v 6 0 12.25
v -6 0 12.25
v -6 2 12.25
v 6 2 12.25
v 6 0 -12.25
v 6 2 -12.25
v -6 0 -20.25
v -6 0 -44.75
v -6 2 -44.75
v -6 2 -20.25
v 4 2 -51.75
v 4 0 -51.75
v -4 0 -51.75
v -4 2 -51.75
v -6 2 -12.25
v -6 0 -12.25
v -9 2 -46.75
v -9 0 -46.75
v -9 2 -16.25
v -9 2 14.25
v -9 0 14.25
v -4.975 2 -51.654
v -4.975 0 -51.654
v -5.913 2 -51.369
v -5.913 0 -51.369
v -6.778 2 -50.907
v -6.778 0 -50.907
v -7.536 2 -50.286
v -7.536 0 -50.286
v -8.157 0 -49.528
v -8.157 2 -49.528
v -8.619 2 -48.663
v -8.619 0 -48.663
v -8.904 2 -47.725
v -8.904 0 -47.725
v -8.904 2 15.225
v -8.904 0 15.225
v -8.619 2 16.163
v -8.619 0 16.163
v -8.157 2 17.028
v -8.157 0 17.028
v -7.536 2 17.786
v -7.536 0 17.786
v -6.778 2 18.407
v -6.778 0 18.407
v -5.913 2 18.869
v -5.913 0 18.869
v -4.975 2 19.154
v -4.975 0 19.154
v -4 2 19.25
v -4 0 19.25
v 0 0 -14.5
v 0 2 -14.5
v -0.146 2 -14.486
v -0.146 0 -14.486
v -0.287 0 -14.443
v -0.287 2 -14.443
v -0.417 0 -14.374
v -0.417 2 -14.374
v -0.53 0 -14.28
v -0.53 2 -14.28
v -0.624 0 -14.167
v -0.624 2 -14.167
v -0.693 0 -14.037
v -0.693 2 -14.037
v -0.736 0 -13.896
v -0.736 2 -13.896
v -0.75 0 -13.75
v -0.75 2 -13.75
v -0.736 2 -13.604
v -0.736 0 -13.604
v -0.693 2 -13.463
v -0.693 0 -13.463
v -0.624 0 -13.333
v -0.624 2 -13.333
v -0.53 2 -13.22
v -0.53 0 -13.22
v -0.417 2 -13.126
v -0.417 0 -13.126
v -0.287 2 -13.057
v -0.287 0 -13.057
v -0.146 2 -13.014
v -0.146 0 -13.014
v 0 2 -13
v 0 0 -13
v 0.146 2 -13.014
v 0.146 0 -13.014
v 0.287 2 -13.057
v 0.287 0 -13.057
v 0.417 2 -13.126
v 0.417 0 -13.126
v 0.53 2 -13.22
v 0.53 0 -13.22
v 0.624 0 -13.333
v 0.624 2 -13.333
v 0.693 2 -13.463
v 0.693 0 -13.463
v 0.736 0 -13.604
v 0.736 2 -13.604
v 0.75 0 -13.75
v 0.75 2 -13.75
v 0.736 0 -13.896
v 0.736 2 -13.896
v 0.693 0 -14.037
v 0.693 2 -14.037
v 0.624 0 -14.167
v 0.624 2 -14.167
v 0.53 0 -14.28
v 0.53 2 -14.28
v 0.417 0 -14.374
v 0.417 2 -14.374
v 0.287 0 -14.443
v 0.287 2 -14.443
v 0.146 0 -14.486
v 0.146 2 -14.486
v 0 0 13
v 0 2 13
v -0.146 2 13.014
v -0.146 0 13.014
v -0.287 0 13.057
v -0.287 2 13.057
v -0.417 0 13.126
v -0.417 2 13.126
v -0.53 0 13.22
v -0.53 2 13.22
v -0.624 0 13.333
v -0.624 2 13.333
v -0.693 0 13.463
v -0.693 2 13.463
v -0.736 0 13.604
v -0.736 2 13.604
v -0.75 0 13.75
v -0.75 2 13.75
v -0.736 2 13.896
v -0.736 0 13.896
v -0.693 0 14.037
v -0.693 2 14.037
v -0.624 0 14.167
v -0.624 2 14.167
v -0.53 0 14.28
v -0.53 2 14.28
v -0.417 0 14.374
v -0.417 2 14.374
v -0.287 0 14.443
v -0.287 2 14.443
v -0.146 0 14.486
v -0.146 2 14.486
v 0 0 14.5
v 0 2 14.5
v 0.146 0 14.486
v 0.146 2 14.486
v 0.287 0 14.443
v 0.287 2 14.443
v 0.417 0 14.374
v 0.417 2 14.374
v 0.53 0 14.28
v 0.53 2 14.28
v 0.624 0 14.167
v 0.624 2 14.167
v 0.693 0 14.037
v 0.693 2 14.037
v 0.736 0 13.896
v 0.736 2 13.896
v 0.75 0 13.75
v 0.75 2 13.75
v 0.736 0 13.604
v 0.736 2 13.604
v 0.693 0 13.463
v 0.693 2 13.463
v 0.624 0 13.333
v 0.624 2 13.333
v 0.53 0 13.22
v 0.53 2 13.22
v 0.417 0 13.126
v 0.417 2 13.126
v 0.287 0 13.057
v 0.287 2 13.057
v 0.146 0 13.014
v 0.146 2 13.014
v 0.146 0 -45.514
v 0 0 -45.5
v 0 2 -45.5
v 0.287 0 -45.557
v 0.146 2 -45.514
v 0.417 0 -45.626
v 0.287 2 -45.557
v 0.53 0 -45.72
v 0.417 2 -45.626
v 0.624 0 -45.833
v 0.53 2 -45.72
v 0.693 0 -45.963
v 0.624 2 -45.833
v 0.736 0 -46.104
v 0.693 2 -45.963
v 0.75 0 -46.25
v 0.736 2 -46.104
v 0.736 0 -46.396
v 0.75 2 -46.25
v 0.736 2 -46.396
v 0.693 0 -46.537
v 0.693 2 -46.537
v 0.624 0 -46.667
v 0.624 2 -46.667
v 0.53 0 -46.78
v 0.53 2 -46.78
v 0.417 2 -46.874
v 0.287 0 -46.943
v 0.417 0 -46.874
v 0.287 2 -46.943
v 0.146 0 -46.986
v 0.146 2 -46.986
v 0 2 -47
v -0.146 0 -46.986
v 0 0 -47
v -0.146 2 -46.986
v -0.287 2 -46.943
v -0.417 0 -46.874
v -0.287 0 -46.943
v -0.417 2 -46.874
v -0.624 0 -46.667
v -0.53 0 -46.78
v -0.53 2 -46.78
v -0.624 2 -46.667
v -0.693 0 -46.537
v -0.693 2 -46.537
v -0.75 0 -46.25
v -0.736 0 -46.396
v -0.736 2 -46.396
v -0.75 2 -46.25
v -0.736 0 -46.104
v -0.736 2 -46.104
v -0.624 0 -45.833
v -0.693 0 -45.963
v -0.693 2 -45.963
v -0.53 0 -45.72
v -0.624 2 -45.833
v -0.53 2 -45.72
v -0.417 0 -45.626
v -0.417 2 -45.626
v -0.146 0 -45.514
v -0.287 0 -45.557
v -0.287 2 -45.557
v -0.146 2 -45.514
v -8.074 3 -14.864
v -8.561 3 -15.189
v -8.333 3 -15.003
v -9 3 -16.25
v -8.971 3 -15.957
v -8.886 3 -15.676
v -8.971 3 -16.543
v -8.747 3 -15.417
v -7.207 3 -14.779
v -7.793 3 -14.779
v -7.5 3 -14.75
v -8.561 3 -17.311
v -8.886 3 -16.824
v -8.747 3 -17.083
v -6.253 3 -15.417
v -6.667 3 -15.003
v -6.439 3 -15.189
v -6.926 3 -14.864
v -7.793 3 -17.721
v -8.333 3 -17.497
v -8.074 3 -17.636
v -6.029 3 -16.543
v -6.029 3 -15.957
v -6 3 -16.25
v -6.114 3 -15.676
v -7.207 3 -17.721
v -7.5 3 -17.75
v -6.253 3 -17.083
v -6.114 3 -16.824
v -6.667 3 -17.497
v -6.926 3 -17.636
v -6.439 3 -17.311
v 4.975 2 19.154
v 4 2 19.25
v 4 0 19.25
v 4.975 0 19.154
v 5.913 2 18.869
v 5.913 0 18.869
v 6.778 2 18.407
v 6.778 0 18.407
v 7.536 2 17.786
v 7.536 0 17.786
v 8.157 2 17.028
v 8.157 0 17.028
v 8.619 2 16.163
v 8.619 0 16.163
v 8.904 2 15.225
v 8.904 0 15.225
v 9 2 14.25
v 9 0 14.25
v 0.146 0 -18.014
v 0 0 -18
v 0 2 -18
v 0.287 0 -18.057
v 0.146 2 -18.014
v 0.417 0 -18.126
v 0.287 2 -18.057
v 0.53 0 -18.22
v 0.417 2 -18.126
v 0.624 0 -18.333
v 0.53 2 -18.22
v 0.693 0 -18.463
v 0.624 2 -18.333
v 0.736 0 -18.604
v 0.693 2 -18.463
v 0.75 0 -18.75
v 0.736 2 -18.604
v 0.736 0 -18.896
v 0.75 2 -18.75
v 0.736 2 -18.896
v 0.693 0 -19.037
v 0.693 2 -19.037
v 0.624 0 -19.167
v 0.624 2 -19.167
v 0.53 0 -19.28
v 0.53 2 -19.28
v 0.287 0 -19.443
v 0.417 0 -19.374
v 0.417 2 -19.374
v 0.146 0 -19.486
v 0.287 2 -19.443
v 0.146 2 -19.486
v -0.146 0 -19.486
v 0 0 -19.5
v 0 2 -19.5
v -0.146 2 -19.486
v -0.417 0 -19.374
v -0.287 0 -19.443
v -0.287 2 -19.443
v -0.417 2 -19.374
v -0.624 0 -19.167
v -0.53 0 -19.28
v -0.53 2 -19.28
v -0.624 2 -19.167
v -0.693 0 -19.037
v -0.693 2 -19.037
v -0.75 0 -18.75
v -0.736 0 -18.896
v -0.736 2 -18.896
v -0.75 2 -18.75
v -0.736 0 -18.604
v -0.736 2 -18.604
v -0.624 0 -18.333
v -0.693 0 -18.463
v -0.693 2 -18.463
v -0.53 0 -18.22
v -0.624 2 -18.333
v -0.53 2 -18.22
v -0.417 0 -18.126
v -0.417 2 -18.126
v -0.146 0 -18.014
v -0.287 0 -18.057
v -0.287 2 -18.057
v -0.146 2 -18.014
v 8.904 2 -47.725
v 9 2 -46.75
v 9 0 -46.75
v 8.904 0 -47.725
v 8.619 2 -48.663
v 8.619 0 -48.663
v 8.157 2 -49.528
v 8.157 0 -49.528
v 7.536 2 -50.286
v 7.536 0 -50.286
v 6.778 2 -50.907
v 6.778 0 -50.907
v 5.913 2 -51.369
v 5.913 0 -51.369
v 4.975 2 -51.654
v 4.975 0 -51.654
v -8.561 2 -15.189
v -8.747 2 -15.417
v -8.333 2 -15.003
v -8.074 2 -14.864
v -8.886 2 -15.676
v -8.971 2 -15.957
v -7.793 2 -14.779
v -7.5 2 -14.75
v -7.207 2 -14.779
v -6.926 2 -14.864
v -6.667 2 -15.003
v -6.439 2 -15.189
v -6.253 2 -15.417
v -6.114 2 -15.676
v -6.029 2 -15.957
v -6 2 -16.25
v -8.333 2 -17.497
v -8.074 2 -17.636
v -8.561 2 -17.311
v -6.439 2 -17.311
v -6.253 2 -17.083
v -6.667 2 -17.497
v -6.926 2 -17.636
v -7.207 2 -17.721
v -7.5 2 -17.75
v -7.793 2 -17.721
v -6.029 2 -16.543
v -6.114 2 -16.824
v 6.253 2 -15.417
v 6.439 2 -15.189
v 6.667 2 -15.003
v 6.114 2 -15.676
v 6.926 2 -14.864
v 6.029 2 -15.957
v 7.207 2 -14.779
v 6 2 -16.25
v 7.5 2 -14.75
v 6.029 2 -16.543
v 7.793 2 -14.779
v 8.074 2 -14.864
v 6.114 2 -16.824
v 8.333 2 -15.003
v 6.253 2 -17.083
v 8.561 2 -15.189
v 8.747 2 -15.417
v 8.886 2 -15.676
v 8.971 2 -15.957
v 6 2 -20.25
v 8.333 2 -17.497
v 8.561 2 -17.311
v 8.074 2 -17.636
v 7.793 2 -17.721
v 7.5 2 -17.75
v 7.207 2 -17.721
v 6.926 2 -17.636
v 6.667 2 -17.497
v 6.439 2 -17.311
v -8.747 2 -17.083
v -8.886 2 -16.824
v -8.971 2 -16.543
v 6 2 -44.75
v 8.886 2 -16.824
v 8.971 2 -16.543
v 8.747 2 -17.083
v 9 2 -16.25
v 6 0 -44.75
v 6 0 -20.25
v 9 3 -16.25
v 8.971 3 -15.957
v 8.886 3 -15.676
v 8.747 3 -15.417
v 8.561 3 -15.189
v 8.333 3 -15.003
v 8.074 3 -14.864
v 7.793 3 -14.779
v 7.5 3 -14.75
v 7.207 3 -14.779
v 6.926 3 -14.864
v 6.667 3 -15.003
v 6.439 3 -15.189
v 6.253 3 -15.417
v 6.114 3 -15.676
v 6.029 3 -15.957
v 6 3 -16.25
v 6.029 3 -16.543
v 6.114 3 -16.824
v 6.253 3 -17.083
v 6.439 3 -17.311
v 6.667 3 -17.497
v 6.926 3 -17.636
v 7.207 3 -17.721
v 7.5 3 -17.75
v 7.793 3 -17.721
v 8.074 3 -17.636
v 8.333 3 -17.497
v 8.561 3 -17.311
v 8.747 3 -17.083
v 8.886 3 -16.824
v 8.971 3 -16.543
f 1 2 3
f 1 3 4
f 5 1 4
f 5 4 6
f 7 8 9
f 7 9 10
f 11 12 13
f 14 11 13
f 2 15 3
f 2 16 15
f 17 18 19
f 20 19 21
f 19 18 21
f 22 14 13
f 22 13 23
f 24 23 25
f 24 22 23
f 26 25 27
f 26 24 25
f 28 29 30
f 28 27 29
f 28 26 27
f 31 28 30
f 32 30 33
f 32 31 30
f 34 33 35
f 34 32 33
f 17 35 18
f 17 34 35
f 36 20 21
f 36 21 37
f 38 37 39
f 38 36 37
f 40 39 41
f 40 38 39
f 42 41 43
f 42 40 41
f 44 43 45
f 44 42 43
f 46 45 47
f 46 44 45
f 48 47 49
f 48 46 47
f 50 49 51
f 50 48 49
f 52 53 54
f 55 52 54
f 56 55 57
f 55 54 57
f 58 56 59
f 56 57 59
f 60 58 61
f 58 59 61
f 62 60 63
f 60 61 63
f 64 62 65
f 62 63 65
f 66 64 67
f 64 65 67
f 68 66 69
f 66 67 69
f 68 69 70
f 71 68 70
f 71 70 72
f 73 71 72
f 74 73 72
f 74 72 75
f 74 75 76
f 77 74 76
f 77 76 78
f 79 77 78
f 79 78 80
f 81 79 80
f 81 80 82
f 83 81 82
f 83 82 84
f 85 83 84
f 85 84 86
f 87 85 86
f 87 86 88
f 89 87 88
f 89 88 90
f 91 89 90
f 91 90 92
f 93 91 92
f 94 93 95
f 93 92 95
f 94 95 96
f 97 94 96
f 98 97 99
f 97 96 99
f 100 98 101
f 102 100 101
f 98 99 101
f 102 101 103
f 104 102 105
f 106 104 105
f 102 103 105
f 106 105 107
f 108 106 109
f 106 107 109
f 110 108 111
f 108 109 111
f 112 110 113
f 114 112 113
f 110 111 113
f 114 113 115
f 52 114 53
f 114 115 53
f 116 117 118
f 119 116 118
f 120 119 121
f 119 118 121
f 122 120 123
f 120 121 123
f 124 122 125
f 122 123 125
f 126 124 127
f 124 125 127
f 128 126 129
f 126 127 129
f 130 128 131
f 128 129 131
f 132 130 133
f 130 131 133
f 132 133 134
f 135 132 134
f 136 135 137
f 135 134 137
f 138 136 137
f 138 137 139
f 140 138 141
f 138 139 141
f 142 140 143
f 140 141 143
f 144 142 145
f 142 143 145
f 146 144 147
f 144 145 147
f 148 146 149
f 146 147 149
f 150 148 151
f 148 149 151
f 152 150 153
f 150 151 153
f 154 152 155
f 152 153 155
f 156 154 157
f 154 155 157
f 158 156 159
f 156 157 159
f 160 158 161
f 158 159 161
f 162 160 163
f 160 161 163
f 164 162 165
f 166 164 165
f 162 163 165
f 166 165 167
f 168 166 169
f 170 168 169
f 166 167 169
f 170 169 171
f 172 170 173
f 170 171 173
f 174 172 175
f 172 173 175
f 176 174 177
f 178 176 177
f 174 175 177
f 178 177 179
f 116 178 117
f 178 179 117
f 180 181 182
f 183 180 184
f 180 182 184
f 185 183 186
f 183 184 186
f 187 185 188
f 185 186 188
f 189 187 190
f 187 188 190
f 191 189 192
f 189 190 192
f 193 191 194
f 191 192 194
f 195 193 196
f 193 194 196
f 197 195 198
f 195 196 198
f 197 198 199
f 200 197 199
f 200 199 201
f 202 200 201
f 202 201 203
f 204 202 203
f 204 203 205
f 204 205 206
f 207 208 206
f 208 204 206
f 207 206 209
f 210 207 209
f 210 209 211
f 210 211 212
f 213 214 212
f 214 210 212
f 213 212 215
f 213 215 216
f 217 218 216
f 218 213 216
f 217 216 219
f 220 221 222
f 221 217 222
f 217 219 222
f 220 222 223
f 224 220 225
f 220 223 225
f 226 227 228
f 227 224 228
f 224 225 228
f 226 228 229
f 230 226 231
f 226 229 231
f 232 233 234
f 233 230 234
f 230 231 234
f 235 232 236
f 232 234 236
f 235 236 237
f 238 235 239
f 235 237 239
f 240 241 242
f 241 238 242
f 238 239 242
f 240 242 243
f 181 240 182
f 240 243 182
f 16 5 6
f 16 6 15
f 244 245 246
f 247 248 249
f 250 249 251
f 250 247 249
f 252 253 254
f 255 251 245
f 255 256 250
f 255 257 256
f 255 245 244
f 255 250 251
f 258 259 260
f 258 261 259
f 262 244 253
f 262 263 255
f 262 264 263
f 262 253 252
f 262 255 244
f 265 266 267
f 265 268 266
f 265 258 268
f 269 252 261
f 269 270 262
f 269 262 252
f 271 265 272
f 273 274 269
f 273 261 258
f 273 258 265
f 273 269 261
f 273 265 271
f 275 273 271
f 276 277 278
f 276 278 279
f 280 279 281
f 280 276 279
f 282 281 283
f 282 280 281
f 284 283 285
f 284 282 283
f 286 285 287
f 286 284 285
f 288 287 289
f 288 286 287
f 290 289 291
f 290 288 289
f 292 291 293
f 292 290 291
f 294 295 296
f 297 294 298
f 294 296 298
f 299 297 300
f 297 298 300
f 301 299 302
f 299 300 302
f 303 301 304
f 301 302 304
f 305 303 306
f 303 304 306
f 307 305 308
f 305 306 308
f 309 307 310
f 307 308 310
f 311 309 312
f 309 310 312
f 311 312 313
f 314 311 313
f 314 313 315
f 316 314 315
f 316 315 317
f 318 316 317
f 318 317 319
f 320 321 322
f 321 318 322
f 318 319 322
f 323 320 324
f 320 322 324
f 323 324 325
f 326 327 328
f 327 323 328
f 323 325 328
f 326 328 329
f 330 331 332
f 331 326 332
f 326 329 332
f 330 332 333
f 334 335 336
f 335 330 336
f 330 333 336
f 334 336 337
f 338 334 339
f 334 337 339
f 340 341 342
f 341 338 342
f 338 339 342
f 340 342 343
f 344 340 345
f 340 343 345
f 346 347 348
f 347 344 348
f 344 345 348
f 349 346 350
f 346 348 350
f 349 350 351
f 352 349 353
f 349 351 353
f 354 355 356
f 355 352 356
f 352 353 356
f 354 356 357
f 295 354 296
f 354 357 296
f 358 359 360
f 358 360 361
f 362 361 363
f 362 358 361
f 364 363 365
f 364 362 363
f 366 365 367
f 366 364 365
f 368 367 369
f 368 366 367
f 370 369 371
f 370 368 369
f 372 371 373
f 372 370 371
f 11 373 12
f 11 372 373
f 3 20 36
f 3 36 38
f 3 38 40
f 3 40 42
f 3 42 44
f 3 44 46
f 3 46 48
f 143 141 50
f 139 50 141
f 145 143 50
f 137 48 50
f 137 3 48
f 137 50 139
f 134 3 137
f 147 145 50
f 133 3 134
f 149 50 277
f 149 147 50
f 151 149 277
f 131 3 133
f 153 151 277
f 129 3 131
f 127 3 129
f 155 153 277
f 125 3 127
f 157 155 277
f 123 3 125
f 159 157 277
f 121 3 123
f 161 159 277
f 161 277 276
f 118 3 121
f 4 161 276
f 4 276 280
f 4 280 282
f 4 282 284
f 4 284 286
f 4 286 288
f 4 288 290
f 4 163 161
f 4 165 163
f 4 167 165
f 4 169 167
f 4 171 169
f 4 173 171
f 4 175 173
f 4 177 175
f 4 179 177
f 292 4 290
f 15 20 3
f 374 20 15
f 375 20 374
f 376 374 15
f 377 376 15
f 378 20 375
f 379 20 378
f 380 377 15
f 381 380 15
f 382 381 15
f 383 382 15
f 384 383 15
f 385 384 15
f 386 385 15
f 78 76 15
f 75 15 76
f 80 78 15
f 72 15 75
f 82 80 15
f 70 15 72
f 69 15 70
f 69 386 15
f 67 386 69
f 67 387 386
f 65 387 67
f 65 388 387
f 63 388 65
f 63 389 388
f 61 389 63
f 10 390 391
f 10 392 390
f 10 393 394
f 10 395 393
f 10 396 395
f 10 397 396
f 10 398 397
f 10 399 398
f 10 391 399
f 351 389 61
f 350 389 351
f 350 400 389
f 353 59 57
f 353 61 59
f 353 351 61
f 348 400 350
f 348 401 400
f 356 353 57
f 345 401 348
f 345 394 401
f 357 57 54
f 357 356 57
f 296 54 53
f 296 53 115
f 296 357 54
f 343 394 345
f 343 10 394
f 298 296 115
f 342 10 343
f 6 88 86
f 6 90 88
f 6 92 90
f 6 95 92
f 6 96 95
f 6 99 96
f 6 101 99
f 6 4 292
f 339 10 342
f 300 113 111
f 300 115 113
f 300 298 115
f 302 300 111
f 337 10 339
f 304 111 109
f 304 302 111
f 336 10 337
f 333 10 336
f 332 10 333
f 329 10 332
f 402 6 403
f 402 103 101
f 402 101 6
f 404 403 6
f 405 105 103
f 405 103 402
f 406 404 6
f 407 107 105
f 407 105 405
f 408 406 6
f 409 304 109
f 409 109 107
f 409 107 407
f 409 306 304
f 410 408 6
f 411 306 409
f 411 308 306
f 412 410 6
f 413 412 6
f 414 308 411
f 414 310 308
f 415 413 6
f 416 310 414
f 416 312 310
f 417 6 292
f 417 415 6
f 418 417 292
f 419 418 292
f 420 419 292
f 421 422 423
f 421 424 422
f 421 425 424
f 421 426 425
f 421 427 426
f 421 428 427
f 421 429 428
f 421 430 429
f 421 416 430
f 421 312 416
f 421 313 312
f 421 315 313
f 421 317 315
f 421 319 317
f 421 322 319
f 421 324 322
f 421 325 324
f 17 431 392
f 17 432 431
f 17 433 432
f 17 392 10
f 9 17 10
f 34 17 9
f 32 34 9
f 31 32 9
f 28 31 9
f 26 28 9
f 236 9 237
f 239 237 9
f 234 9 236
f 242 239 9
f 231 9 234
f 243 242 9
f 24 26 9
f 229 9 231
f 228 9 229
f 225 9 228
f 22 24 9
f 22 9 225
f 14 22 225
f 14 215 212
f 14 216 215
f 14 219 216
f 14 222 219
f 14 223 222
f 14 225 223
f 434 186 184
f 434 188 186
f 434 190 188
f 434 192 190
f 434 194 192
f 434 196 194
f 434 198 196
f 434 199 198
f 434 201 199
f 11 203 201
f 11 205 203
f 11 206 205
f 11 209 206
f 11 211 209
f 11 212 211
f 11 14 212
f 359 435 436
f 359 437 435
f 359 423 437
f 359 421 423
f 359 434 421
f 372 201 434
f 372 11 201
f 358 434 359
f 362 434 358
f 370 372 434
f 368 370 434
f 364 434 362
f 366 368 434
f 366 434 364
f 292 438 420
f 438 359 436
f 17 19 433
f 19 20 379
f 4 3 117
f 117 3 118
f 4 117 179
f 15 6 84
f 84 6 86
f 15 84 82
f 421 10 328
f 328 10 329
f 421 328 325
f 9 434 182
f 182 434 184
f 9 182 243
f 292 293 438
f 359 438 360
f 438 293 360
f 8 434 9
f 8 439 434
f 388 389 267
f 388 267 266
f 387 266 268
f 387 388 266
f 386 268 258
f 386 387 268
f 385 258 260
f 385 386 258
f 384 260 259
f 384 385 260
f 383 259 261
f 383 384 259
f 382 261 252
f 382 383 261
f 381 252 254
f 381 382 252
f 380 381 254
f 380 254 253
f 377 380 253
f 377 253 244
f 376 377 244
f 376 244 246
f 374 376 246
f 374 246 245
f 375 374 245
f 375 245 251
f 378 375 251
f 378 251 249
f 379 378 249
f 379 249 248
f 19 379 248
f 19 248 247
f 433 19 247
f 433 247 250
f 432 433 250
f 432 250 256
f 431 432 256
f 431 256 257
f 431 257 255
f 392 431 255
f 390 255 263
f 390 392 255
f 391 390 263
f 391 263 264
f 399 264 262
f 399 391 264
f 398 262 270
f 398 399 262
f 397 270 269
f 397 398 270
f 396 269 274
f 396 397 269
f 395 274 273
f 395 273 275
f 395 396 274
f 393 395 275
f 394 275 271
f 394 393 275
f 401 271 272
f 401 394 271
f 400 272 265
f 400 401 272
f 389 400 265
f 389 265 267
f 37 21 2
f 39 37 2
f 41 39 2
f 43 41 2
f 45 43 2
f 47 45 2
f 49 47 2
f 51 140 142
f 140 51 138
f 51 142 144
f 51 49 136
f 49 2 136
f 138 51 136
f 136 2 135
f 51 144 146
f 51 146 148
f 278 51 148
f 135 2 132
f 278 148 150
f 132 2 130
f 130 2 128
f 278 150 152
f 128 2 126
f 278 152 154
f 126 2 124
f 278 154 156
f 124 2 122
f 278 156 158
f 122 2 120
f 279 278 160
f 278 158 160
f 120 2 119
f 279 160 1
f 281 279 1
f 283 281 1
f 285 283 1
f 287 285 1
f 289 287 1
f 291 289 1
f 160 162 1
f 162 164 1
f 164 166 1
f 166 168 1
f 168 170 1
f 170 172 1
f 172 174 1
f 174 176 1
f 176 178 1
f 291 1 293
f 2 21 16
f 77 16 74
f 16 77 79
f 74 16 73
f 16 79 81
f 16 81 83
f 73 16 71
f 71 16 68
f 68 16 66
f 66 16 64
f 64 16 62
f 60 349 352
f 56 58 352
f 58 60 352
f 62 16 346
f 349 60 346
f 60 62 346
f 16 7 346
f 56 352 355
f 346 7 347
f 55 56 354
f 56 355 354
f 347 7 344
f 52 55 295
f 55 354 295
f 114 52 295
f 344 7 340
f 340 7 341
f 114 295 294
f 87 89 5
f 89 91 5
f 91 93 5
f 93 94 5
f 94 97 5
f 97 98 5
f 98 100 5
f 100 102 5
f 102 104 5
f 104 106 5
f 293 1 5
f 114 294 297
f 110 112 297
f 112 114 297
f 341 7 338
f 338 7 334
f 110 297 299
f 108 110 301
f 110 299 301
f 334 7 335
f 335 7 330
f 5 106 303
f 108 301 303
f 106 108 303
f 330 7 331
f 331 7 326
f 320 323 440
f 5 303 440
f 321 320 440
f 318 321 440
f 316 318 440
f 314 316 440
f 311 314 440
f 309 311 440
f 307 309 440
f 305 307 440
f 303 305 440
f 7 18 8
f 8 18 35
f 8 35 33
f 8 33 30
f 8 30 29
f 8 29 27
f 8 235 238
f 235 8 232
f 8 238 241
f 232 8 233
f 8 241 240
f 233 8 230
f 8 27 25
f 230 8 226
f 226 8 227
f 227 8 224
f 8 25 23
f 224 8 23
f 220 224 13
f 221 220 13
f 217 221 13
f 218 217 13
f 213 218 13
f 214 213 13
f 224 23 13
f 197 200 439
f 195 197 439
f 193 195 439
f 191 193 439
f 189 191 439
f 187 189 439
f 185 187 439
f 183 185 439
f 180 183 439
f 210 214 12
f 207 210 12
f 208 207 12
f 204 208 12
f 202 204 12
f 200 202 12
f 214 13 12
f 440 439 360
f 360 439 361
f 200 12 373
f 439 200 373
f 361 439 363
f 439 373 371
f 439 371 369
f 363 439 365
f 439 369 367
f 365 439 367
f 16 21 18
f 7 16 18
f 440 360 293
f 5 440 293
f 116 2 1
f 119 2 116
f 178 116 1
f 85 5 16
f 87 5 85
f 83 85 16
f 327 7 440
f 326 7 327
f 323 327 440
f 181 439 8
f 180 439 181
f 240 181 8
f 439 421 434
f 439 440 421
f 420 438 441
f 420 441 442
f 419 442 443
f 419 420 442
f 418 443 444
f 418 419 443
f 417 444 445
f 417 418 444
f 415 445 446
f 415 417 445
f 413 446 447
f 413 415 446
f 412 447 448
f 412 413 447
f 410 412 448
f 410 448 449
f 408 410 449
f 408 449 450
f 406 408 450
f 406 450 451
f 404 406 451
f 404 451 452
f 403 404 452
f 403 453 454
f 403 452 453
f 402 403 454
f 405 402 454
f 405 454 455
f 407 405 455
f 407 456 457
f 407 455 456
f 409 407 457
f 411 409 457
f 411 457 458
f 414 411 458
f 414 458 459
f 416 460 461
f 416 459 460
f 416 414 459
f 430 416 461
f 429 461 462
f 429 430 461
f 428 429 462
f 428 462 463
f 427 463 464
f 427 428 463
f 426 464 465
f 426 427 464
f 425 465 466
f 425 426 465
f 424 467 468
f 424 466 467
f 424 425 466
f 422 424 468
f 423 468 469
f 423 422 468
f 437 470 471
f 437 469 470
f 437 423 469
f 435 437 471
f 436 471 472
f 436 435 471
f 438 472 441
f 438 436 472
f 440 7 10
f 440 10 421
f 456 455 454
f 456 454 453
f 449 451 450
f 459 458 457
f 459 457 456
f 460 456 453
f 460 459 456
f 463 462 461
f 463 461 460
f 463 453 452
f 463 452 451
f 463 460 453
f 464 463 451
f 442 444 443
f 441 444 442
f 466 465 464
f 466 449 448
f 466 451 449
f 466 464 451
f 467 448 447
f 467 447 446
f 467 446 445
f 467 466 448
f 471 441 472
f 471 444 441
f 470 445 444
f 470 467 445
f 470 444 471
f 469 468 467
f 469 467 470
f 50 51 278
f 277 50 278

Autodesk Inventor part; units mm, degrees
ref_plane "YZ Plane" through (0, 0, 0) normal (1, 0, 0) x (0, 1, 0)
ref_plane "XZ Plane" through (0, 0, 0) normal (0, 1, 0) x (-1, 0, 0)
sketch "スケッチ1" plane through (0, 0, 0) normal (0, 1, 0) x (-1, 0, 0)
  line L0 (6, 12.25) -> (-6, 12.25)
  line L1 (-6, 12.25) -> (-6, -12.25)
  line L2 (-6, -12.25) -> (6, -12.25)
  line L3 (6, -12.25) -> (6, 12.25)
  line L4 (9, 19.25) -> (-9, 19.25)
  line L5 (-9, 19.25) -> (-9, -16.25)
  line L6 (-9, -16.25) -> (9, -16.25)
  line L7 (9, -16.25) -> (9, 19.25)
  line L8 (0, -13.75) -> (0, 13.75) construction
  point P0 (0, 0)
  point P1 (6, 0)
  point P2 (0, 12.25)
  point P3 (0, 19.25)
  point P4 (9, 1.5)
  point P5 (0, 0)
  dimension "d0" = 24.5
  dimension "d1" = 12
  dimension "d2" = 3
  dimension "d3" = 4
  dimension "d4" = 7
  dimension "d8" = 27.5
extrude "押し出し1" add sketch "スケッチ1" along normal blind 2
hole "穴1" at (0, 0, -13.75) at (0, 0, 13.75) direction (0, 1, 0) diameter 1.5 end through all
mirror "ミラー1" about plane through (9, 0, -16.25) normal (0, 0, -1) of "押し出し1", "穴1"
fillet "フィレット1" radius 5 4 edges at (-9, 1, 19.25) (9, 1, 19.25) (9, 1, -51.75) (-9, 1, -51.75)
ref_plane "位置合わせ" through (-6, 0, -16.25) normal (0, 0, 1) x (1, 0, 0)
sketch "スケッチ2" plane through (0, 2, 0) normal (0, 1, 0) x (1, 0, 0)
  line L0 (-9, -14.25) -> (-9, 46.75) projected
  line L1 (9, -14.25) -> (9, 46.75) projected
  circle A0 centre (0, 18.75) radius 0.75 projected
  circle A1 centre (0, 13.75) radius 0.75 projected
  circle A2 centre (7.5, 16.25) radius 1.5
  circle A3 centre (-7.5, 16.25) radius 1.5
  line L2 (0, 18.75) -> (0, 13.75) construction
  point P0 (0, 0)
  point P1 (0, 16.25)
  dimension "d16" = 3
extrude "押し出し2" add sketch "スケッチ2" along normal blind 1 contours A2 | A3
properties part number "ServoMotor_Holder_V2"
